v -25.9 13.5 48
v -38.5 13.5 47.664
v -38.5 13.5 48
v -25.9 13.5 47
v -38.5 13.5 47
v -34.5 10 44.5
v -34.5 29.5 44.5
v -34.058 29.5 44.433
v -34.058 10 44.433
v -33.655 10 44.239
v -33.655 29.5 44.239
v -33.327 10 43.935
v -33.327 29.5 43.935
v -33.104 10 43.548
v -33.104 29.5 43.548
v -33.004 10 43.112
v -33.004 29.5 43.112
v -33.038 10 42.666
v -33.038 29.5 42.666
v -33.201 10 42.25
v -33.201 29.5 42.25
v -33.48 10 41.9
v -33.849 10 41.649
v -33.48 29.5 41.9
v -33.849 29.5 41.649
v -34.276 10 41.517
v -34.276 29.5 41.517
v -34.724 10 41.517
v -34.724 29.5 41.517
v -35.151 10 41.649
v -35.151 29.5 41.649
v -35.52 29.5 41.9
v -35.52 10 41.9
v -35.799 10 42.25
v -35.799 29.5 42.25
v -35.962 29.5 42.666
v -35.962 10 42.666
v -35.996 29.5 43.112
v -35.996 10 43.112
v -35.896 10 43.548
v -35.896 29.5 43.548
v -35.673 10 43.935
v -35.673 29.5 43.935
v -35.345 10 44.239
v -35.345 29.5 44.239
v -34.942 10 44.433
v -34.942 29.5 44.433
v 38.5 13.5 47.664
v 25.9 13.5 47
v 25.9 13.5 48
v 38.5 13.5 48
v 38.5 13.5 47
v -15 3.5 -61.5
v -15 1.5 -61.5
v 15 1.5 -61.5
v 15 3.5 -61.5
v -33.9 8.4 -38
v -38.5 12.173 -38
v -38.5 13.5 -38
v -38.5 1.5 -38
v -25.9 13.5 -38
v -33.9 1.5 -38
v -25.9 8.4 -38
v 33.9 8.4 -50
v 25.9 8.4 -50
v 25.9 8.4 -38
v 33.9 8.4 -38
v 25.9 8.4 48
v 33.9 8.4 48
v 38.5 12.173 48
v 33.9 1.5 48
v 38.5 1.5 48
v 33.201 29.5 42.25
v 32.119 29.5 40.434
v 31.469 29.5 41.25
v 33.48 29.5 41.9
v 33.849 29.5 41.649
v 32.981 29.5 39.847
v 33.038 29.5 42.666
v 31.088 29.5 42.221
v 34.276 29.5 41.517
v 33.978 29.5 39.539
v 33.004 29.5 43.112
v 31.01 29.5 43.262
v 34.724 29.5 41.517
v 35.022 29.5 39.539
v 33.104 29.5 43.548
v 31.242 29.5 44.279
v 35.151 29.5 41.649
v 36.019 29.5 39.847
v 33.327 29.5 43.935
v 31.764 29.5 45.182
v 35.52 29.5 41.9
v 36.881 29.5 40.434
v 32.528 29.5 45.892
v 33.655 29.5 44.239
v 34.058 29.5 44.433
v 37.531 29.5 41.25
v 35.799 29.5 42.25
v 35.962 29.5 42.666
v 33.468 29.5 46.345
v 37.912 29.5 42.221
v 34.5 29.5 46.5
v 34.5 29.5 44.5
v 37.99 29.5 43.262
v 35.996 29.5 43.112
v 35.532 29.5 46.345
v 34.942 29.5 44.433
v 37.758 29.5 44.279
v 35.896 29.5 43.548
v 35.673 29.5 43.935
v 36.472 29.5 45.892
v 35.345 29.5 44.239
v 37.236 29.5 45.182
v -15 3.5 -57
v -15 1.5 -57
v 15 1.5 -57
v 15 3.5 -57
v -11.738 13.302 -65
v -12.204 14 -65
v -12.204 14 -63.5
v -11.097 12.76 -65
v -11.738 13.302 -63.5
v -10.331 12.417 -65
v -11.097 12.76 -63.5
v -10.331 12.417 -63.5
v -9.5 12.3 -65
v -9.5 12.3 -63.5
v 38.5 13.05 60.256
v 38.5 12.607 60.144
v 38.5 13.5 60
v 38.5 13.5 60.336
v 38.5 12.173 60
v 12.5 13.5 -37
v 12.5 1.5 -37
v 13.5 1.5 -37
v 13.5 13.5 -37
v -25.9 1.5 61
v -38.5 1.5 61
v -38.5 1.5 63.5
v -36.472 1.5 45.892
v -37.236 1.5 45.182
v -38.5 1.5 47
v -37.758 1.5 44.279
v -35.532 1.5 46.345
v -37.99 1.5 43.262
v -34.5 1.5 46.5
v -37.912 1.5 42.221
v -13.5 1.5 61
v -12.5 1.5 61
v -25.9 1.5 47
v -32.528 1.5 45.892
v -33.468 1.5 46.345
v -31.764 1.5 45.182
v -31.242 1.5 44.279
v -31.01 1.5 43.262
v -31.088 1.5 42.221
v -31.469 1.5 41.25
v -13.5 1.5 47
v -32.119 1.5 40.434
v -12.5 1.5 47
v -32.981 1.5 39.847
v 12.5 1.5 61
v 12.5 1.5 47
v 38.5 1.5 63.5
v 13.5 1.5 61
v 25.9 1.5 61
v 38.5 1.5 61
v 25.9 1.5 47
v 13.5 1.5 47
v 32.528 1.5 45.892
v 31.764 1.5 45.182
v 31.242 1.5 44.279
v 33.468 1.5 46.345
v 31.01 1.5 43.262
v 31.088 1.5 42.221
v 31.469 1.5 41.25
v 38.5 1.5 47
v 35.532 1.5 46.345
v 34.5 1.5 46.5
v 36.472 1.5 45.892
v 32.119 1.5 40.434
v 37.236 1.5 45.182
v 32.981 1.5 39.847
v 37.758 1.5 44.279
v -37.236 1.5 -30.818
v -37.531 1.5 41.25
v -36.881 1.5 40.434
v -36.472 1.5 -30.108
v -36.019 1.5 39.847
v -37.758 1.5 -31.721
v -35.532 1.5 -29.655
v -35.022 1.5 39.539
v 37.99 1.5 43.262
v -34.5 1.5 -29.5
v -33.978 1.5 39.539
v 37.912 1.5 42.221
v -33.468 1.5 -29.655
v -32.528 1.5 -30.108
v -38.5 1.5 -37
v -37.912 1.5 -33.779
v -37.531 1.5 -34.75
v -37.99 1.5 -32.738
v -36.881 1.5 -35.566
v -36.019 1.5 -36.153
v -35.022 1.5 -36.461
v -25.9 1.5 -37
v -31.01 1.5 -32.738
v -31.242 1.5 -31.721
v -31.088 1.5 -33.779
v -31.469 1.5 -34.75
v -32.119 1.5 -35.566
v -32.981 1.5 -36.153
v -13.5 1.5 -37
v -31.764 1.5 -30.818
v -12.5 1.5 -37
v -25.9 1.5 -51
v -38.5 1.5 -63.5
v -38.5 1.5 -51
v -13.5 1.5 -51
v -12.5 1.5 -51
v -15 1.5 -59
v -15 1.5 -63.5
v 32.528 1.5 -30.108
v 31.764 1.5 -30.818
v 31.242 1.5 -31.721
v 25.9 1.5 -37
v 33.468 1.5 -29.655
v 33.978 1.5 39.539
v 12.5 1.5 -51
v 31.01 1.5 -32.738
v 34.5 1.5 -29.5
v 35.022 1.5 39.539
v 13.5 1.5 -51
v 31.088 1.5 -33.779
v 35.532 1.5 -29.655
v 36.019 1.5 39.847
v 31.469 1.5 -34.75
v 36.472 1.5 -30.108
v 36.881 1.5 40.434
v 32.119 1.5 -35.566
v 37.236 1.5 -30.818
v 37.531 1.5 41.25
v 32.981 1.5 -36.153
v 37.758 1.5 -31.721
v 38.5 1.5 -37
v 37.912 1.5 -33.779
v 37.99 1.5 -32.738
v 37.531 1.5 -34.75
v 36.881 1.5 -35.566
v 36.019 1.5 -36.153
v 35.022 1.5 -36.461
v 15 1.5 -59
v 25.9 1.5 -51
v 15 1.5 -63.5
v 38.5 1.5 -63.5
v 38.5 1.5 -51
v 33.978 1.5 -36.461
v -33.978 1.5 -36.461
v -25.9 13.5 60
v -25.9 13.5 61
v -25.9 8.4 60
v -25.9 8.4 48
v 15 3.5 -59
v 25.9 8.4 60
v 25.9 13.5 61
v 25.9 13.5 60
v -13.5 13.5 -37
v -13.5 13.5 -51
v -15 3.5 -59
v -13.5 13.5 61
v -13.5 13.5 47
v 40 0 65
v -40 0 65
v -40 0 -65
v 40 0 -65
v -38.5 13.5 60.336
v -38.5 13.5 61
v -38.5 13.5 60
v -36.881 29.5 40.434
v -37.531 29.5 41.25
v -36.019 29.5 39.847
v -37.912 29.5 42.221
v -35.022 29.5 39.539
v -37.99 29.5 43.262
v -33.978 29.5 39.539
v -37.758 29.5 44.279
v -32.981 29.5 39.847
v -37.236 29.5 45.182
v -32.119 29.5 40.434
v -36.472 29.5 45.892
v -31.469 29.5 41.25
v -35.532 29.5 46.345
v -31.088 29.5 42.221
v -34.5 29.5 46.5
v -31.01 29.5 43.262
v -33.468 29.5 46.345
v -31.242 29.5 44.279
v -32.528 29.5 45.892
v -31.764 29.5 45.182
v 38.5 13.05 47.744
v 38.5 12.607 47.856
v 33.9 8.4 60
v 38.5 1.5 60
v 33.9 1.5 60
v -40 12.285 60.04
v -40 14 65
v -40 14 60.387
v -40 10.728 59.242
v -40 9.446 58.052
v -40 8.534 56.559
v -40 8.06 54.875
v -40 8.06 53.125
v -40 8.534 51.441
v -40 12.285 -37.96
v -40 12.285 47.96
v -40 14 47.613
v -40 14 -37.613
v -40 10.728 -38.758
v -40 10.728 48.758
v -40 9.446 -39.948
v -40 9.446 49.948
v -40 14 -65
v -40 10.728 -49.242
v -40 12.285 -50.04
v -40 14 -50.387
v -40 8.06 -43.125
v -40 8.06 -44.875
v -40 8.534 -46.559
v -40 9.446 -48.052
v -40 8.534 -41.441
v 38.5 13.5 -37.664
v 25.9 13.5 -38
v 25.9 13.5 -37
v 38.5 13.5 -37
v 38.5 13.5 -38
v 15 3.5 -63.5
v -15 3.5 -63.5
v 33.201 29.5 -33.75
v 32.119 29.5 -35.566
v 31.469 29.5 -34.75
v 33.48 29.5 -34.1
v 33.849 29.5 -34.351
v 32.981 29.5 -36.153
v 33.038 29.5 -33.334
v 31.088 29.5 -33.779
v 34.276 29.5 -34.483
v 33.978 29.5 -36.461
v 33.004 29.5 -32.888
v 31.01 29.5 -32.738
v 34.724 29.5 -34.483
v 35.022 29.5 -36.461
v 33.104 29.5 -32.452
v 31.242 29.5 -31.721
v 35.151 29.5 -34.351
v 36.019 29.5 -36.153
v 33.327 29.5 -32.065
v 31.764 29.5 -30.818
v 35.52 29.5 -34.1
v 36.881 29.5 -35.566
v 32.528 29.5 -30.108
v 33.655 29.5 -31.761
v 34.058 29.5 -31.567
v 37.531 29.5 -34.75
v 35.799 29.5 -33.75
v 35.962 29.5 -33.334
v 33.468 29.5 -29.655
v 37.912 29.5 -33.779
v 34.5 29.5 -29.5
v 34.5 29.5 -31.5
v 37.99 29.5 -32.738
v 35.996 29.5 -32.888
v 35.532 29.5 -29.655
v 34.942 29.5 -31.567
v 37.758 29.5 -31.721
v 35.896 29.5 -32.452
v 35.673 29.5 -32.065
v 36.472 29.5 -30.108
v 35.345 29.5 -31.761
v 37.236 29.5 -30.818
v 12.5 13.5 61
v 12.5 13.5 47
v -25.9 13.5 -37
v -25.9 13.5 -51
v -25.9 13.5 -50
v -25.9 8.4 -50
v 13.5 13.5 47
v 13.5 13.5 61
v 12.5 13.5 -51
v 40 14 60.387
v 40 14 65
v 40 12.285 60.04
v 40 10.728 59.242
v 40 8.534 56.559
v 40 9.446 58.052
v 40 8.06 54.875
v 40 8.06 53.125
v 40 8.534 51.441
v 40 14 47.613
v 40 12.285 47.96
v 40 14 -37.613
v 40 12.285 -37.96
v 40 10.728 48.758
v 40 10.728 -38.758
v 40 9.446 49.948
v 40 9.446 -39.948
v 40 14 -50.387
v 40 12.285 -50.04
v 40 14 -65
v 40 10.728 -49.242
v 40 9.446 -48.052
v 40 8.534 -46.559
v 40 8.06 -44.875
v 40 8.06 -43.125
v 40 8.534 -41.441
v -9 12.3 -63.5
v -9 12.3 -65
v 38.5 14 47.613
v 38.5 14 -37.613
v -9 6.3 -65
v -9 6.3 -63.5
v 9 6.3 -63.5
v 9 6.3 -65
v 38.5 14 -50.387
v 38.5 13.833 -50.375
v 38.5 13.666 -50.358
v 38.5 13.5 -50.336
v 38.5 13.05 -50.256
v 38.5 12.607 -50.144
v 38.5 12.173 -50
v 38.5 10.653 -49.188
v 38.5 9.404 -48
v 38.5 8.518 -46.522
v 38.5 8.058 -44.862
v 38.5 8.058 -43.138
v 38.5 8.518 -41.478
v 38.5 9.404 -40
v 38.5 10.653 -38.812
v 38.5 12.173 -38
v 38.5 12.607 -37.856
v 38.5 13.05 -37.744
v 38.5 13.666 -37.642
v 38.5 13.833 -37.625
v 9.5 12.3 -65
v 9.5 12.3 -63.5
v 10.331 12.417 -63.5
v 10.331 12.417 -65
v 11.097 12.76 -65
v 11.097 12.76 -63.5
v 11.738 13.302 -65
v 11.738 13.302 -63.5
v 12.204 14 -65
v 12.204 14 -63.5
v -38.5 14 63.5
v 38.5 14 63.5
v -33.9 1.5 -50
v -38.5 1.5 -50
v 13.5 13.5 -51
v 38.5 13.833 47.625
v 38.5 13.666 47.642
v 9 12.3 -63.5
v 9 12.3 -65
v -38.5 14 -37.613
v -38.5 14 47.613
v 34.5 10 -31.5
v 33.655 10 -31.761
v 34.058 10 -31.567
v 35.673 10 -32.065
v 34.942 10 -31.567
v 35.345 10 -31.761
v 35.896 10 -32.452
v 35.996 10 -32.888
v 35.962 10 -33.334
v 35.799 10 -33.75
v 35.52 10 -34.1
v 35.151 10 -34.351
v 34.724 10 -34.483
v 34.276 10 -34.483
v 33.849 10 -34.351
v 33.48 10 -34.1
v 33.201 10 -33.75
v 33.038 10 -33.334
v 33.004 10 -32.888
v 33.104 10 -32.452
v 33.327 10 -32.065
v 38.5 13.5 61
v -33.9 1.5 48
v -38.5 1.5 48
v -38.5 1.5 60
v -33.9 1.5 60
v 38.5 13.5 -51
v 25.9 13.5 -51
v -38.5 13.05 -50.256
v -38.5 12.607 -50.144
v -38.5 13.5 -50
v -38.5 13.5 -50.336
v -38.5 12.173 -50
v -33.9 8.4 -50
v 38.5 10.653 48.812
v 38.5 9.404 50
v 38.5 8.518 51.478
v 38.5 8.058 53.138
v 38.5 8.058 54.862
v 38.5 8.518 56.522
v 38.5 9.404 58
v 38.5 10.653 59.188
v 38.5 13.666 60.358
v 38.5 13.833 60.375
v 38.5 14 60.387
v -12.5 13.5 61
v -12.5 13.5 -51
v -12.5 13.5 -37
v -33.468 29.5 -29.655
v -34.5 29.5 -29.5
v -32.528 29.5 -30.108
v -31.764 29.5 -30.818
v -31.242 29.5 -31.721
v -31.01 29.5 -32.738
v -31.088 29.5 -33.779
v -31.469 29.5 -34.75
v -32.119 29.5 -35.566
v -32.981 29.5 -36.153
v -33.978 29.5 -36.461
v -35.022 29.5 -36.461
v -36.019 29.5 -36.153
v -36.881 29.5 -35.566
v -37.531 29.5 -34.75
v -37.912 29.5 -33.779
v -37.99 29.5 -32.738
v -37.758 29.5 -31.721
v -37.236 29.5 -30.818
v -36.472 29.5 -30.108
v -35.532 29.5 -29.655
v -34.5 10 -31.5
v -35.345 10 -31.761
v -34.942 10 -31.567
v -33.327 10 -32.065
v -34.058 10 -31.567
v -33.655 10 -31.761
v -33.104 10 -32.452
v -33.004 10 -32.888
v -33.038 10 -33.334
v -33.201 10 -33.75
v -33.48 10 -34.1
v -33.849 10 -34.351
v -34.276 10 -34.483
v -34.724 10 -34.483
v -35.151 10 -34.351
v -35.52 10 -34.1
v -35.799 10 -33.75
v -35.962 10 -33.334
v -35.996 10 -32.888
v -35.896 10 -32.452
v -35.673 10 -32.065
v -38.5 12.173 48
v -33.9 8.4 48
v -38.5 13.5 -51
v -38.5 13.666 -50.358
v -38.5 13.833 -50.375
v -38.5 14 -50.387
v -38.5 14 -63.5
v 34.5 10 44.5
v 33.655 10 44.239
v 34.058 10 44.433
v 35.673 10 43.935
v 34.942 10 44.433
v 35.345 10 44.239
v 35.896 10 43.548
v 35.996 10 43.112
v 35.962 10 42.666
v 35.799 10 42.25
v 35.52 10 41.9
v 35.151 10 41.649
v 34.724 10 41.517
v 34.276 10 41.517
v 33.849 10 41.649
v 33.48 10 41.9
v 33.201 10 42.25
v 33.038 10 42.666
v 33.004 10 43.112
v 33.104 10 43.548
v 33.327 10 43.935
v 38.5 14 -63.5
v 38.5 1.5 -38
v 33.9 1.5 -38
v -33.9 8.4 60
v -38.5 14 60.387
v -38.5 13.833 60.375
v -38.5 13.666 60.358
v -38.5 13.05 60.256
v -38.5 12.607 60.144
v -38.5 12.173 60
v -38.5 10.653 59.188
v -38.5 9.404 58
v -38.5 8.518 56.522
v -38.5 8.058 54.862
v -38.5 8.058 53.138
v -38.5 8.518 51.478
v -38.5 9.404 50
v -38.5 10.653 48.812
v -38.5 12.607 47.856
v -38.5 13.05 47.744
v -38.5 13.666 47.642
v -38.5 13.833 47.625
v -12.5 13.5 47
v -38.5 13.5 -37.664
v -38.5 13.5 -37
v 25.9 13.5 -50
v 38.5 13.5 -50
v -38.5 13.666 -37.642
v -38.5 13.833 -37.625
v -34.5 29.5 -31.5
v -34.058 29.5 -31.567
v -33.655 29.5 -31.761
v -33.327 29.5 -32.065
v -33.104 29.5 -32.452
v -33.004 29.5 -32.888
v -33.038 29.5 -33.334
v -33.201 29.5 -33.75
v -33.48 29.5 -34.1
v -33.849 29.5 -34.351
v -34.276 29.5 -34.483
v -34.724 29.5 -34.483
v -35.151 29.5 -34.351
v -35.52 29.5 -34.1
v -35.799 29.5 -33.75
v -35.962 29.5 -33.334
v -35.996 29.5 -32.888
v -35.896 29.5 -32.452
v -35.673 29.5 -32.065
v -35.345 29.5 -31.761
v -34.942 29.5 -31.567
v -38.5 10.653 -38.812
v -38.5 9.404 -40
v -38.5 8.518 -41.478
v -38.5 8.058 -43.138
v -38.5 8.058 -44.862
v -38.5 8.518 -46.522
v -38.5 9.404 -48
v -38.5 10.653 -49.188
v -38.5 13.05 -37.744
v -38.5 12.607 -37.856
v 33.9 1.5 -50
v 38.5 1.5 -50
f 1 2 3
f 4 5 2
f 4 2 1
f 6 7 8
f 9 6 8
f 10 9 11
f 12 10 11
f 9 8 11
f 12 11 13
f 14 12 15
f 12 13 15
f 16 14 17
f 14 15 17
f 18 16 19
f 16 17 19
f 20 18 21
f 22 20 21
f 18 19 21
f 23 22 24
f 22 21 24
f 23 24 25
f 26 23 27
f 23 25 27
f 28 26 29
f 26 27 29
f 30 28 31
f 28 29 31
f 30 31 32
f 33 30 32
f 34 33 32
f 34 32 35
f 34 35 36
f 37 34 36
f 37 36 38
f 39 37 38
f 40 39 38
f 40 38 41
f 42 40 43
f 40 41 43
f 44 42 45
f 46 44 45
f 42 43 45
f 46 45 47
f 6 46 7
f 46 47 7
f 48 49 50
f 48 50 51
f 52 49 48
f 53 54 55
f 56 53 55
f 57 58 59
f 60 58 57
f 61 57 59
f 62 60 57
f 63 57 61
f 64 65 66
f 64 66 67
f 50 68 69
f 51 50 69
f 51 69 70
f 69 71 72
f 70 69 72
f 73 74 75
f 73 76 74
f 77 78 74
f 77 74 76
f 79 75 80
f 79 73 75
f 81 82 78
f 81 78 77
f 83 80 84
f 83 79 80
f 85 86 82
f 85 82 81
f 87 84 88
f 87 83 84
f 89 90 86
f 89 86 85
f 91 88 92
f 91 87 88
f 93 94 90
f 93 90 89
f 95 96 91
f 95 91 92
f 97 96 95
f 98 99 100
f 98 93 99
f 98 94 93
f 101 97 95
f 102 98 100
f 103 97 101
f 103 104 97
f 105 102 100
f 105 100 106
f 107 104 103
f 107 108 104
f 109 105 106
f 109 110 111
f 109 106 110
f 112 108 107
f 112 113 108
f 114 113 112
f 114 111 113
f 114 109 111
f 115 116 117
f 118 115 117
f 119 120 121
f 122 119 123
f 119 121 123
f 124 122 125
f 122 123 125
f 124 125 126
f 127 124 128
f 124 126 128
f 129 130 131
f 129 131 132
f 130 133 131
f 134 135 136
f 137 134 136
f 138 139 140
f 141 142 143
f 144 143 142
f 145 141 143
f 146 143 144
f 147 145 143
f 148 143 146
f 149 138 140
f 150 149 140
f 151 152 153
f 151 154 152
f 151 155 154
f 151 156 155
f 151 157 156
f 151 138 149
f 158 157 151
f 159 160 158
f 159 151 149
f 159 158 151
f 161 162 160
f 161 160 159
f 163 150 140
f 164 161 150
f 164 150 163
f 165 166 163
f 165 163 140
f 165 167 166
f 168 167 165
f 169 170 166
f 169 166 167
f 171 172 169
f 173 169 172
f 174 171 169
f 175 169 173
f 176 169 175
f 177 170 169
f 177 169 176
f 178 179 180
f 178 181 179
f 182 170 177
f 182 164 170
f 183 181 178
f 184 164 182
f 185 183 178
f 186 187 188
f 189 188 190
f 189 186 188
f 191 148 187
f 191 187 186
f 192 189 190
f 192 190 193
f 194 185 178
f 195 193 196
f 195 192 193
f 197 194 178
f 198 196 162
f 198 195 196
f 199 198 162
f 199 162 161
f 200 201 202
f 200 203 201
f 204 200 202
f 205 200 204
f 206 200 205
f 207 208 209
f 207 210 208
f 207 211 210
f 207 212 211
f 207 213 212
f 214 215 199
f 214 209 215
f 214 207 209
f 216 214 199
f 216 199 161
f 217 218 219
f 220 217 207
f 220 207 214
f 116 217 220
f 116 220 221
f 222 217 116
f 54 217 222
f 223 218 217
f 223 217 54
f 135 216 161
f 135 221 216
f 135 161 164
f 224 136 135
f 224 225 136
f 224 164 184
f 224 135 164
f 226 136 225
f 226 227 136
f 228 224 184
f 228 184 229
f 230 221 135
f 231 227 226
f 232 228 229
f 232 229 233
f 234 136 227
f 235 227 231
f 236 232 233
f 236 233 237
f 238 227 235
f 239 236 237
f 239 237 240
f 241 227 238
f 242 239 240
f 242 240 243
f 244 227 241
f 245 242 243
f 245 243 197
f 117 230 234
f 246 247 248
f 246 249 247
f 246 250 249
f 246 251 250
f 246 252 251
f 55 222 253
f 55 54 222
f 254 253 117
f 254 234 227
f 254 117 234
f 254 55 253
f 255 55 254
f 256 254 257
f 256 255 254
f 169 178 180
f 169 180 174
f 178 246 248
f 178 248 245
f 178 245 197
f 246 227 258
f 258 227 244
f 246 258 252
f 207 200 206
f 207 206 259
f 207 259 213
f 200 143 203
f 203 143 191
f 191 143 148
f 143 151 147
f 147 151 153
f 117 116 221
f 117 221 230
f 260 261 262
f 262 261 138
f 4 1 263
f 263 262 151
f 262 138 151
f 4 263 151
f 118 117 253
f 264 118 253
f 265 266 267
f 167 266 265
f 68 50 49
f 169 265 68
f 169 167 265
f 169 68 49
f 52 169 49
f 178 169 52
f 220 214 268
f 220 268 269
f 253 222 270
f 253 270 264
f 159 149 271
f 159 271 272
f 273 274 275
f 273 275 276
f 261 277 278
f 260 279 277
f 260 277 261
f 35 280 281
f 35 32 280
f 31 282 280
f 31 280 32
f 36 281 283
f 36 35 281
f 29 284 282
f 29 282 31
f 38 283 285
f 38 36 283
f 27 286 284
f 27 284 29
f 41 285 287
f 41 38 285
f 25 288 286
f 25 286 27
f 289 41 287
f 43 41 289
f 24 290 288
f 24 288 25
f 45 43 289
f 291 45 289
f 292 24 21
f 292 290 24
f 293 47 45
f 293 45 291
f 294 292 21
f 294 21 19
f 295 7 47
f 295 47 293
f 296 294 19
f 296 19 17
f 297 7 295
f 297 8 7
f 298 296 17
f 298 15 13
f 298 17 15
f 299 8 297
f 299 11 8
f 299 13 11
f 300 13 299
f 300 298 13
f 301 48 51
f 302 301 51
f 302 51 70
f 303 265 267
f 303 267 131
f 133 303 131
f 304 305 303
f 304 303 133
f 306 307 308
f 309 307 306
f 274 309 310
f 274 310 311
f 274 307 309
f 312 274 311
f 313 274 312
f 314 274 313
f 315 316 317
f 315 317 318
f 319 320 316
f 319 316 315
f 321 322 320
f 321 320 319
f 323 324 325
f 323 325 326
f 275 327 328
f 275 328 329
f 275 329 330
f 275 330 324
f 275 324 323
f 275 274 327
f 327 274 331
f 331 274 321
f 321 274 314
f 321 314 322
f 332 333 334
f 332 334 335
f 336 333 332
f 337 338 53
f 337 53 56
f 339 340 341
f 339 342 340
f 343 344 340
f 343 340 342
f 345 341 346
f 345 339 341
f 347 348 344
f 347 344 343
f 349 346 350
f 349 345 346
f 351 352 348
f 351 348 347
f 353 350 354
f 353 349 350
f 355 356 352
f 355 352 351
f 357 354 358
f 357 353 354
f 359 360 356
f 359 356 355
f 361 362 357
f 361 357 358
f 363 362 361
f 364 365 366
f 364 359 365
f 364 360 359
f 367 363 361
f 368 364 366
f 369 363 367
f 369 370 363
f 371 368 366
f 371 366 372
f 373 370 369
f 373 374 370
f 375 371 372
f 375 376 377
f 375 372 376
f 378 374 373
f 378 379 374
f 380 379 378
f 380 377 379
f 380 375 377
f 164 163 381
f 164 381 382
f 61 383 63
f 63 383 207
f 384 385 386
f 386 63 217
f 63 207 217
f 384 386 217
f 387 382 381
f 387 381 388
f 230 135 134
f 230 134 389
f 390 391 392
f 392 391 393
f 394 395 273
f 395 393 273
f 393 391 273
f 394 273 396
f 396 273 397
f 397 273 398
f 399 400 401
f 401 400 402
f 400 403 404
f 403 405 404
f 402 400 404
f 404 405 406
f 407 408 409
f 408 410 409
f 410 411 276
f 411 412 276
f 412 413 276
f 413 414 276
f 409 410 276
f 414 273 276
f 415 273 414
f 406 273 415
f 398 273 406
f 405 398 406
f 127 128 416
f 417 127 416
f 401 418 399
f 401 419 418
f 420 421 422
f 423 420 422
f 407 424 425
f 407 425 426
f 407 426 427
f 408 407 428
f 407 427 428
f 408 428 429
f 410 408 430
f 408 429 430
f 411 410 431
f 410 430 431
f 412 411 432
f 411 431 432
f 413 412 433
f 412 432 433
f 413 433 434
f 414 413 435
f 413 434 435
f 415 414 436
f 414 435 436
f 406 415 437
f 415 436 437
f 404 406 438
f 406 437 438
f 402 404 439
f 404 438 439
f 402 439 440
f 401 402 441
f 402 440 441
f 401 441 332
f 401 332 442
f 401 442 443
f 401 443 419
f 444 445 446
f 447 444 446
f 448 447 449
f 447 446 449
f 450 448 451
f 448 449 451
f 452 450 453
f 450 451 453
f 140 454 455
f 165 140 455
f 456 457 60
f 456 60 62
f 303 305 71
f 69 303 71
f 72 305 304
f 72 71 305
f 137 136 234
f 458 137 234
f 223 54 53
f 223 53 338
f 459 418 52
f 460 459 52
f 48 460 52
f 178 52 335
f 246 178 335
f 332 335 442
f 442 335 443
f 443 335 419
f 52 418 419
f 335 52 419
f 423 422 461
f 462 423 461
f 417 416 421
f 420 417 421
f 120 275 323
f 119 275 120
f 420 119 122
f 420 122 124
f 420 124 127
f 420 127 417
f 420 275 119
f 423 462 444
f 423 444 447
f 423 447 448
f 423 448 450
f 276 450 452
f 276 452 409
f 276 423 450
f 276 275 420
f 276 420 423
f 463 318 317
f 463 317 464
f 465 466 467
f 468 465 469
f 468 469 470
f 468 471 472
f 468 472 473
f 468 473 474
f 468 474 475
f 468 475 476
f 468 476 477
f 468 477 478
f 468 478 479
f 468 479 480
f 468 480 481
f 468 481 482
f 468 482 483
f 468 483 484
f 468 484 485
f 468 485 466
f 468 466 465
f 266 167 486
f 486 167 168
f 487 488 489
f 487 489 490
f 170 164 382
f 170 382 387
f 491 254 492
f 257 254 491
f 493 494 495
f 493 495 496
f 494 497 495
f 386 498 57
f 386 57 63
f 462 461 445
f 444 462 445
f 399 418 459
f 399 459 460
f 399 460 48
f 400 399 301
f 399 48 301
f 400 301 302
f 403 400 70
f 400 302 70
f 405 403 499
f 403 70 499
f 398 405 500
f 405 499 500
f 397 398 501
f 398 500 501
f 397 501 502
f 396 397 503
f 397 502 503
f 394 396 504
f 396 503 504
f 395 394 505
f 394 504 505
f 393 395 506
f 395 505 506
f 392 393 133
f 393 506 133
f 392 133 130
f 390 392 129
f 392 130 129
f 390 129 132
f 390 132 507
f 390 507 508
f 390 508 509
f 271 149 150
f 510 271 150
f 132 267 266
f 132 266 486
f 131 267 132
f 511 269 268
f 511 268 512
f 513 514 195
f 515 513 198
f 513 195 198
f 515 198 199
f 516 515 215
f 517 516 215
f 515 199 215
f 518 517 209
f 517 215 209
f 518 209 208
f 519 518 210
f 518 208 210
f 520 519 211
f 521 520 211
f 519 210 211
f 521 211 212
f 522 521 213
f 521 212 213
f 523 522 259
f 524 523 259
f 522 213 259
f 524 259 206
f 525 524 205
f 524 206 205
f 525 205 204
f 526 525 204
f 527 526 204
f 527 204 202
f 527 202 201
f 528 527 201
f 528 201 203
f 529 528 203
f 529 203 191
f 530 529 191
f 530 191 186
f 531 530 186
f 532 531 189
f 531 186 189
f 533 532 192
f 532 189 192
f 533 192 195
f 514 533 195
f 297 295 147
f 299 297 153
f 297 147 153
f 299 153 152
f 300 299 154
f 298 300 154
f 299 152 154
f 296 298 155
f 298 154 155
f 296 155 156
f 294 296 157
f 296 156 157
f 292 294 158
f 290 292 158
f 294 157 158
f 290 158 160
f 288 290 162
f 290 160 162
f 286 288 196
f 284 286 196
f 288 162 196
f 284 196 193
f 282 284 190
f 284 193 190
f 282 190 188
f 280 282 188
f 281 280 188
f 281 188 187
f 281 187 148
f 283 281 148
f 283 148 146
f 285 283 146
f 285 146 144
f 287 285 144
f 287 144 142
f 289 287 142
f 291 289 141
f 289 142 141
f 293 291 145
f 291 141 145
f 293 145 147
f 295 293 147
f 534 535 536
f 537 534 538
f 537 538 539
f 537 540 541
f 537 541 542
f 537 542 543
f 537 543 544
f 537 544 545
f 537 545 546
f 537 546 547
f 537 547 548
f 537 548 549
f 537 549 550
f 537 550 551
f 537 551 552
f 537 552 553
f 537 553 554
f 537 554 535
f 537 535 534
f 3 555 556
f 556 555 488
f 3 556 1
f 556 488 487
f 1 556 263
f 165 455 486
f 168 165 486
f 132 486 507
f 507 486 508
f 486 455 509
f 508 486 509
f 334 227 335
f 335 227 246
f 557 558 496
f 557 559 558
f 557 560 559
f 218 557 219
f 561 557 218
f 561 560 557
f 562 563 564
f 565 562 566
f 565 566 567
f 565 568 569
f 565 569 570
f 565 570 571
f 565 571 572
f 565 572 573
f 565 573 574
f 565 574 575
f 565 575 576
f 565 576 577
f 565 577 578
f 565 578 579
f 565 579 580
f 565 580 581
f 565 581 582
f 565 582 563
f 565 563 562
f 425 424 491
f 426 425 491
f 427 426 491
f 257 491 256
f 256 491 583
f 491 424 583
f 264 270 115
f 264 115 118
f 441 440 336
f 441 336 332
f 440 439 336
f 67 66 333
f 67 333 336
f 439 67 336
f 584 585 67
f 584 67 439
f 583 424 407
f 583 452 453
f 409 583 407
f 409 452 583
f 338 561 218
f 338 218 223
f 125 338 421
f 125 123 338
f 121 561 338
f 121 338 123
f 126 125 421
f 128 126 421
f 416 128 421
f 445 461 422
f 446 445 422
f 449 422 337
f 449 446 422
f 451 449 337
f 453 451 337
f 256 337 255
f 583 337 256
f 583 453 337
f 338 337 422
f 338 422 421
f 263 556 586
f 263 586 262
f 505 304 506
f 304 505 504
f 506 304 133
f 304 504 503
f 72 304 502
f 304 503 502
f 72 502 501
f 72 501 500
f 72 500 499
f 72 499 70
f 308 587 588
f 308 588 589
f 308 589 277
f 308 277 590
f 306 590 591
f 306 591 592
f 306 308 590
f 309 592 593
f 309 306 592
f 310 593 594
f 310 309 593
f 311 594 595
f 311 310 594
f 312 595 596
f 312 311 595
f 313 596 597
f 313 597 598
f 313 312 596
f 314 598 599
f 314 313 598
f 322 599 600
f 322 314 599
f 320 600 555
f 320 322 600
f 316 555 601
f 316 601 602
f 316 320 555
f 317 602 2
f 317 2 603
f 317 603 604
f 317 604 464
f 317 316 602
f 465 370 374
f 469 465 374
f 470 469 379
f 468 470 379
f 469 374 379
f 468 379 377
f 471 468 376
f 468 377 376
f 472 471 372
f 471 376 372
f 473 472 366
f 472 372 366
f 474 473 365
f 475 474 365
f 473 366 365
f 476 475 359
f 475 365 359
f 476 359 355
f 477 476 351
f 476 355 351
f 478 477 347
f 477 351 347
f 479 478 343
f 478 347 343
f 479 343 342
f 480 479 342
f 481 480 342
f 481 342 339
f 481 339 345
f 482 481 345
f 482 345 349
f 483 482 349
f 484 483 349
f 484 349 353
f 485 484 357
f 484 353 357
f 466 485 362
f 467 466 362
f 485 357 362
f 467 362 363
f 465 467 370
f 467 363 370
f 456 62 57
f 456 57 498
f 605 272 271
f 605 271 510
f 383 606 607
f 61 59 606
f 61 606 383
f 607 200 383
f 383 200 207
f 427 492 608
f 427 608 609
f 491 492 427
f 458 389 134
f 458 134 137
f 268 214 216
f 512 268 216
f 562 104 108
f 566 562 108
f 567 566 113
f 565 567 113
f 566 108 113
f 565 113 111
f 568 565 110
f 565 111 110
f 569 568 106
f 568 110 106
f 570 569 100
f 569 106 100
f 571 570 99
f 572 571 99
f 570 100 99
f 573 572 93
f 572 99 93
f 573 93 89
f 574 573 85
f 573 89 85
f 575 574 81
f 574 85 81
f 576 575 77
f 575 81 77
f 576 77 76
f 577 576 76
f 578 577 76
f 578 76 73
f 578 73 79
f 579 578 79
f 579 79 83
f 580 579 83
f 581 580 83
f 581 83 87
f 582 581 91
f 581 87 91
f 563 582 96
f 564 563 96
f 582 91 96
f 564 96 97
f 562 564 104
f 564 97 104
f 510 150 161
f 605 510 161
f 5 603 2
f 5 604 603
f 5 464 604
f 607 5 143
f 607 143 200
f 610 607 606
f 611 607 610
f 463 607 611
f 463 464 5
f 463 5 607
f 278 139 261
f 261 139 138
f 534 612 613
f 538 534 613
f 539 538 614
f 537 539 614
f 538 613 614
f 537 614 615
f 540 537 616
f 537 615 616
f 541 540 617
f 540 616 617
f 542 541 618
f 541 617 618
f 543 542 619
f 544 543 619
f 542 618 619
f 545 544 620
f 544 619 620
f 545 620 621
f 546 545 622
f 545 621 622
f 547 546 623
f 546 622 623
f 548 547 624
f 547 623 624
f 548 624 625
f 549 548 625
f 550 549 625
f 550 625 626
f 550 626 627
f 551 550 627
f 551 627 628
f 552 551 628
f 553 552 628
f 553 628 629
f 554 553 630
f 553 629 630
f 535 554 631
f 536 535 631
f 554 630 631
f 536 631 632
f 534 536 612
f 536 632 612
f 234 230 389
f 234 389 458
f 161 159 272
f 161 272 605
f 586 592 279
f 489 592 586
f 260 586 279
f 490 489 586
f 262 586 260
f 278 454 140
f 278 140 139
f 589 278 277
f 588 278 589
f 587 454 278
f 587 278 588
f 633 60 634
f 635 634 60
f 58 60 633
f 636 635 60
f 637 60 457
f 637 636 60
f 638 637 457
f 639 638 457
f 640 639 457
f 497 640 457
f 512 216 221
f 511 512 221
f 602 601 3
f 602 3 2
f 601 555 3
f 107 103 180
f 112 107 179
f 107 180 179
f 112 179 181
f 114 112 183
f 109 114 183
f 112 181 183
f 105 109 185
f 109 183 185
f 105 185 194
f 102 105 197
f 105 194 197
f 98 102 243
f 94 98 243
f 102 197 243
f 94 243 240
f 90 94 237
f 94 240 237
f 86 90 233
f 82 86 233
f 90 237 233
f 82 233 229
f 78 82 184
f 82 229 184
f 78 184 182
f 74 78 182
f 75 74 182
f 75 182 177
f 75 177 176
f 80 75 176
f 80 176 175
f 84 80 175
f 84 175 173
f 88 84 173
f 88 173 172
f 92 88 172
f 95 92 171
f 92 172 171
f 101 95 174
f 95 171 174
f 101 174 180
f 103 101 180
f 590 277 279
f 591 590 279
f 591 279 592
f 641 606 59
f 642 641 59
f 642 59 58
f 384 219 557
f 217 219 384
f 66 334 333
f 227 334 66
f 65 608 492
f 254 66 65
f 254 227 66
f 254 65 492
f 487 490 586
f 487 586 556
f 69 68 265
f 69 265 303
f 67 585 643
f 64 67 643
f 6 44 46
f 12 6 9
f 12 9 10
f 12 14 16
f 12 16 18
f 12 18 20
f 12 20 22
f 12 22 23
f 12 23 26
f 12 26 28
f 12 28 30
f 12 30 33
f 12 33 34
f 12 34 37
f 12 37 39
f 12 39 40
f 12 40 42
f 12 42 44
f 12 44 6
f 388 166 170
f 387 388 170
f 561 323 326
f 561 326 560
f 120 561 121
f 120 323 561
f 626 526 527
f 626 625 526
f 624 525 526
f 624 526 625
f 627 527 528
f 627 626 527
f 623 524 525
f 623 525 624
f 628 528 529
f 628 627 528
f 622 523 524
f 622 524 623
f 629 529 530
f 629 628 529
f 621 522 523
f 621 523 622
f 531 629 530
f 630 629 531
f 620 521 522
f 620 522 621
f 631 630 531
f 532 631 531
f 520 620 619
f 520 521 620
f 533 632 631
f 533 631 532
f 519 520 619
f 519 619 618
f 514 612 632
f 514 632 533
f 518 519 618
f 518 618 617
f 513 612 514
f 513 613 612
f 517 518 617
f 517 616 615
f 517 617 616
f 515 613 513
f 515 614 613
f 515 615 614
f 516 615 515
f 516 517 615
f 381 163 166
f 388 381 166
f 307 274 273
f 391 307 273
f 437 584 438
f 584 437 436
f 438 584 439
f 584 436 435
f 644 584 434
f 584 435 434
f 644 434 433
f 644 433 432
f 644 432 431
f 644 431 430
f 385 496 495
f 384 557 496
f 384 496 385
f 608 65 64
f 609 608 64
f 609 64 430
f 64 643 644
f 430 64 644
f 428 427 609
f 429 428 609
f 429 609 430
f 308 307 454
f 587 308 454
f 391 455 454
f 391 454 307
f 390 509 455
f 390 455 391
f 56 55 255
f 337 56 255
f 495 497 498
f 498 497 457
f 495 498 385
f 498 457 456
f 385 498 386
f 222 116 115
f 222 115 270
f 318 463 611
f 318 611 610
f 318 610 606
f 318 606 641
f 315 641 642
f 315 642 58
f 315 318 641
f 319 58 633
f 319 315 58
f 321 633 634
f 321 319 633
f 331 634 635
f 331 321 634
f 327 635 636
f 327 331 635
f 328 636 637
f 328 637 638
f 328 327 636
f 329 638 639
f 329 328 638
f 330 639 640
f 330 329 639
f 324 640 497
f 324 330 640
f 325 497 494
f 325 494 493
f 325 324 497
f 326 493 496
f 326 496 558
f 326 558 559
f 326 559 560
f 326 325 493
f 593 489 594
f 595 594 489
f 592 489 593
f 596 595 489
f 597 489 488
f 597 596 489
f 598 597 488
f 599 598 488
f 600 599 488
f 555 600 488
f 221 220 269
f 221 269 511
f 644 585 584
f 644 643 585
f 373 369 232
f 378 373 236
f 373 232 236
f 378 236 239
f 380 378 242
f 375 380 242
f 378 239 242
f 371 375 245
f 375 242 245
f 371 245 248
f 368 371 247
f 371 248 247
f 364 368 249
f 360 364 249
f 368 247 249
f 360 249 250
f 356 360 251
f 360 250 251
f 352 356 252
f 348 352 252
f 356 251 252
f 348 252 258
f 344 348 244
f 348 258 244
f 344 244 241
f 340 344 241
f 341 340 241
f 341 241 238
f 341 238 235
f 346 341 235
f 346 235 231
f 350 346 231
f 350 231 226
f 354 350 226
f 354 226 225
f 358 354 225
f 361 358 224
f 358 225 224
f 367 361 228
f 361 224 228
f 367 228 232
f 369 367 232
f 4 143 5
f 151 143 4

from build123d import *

# Parameters (mm, degrees)
SKETCH_262_W         = 80
SKETCH_262_H         = 130
EXTRUDE_1_DEPTH      = 14
SKETCH_1_W           = 77
SKETCH_1_H           = 127
CUT_EXTRUDE_1_DEPTH  = 12.5
CUT_EXTRUDE_2_DEPTH  = 2
SKETCH_10_W          = 8
SKETCH_10_H          = 12
EXTRUDE_2_DEPTH      = 6.9
SKETCH_11_W          = 12.6
SKETCH_11_H          = 1
EXTRUDE_3_DEPTH      = 12
SKETCH_13_R          = 3.5
EXTRUDE_4_DEPTH      = 28
CUT_EXTRUDE_9_DEPTH  = 1.5
CUT_EXTRUDE_START    = -1.5
CUT_EXTRUDE_10_DEPTH = 1.5
CUT_EXTRUDE_11_DEPTH = 1.5
CUT_EXTRUDE_12_DEPTH = 1.5
SKETCH_15_R          = 1.5
CUT_EXTRUDE_14_DEPTH = 19.5
SKETCH_16_W          = 30
SKETCH_16_H          = 2
EXTRUDE_5_DEPTH      = 2
SKETCH_17_W          = 1
SKETCH_17_H          = 14
EXTRUDE_6_DEPTH      = 12


with BuildPart() as part:
    # Sketch 262 → Бобышка-Вытянуть1 (new body)
    with BuildSketch(Plane(origin=(0, 0, 0), x_dir=(1, 0, 0), z_dir=(0, 1, 0))):
        Rectangle(SKETCH_262_W, SKETCH_262_H)
    extrude(amount=EXTRUDE_1_DEPTH)

    # Эскиз1 → Вырез-Вытянуть1 (cut)
    with BuildSketch(Plane(origin=(0, 14, 0), x_dir=(1, 0, 0), z_dir=(0, 1, 0))):
        Rectangle(SKETCH_1_W, SKETCH_1_H)
    extrude(amount=-CUT_EXTRUDE_1_DEPTH, mode=Mode.SUBTRACT)

    # Эскиз2 → Вырез-Вытянуть2 (cut)
    with BuildSketch(Plane.XY.offset(-63.5)):
        with BuildLine():
            Line((-9, 18.3), (-9.5, 18.3))
            ThreePointArc((-9.5, 18.3), (-12.5, 15.3), (-9.5, 12.3))
            Line((-9.5, 12.3), (-9, 12.3))
            Line((-9, 12.3), (-9, 6.3))
            Line((-9, 6.3), (9, 6.3))
            Line((9, 6.3), (9, 12.3))
            Line((9, 12.3), (9.5, 12.3))
            ThreePointArc((9.5, 12.3), (12.5, 15.3), (9.5, 18.3))
            Line((9.5, 18.3), (9, 18.3))
            Line((9, 18.3), (9, 24.3))
            Line((9, 24.3), (-9, 24.3))
            Line((-9, 24.3), (-9, 18.3))
        make_face()
    extrude(amount=-CUT_EXTRUDE_2_DEPTH, mode=Mode.SUBTRACT)

    # Эскиз10 → Бобышка-Вытянуть2 (add)
    with BuildSketch(Plane(origin=(0, 1.5, 0), x_dir=(1, 0, 0), z_dir=(0, 1, 0))):
        with Locations((-29.9, 44)):
            Rectangle(SKETCH_10_W, SKETCH_10_H)
        with Locations((29.9, 44)):
            Rectangle(SKETCH_10_W, SKETCH_10_H)
        with Locations((-29.9, -54)):
            Rectangle(SKETCH_10_W, SKETCH_10_H)
        with Locations((29.9, -54)):
            Rectangle(SKETCH_10_W, SKETCH_10_H)
    extrude(amount=EXTRUDE_2_DEPTH)

    # Эскиз11 → Бобышка-Вытянуть3 (add)
    with BuildSketch(Plane(origin=(0, 1.5, 0), x_dir=(1, 0, 0), z_dir=(0, 1, 0))):
        with Locations((-32.2, 50.5)):
            Rectangle(SKETCH_11_W, SKETCH_11_H)
        with Locations((32.2, 50.5)):
            Rectangle(SKETCH_11_W, SKETCH_11_H)
        with Locations((-32.2, 37.5)):
            Rectangle(SKETCH_11_W, SKETCH_11_H)
        with Locations((32.2, 37.5)):
            Rectangle(SKETCH_11_W, SKETCH_11_H)
        with Locations((32.2, -47.5)):
            Rectangle(SKETCH_11_W, SKETCH_11_H)
        with Locations((32.2, -60.5)):
            Rectangle(SKETCH_11_W, SKETCH_11_H)
        with Locations((-32.2, -47.5)):
            Rectangle(SKETCH_11_W, SKETCH_11_H)
        with Locations((-32.2, -60.5)):
            Rectangle(SKETCH_11_W, SKETCH_11_H)
    extrude(amount=EXTRUDE_3_DEPTH)

    # Эскиз13 → Бобышка-Вытянуть4 (add)
    with BuildSketch(Plane(origin=(0, 1.5, 0), x_dir=(1, 0, 0), z_dir=(0, 1, 0))):
        with Locations(Location((-34.5, 33, 0), (0, 0, 270))):
            Circle(SKETCH_13_R)
        with Locations(Location((34.5, 33, 0), (0, 0, 270))):
            Circle(SKETCH_13_R)
        with Locations(Location((-34.5, -43, 0), (0, 0, 270))):
            Circle(SKETCH_13_R)
        with Locations(Location((34.5, -43, 0), (0, 0, 270))):
            Circle(SKETCH_13_R)
    extrude(amount=EXTRUDE_4_DEPTH)

    # Эскиз5 → Вырез-Вытянуть9 (cut)
    with BuildSketch(Plane.ZY.offset(40)):
        with BuildLine():
            Line((57.199546833, 20.146147769), (57.196157558, 19.944779244))
            ThreePointArc((57.196157558, 19.944779244), (54, 8), (50.803842442, 19.944779244))
            Line((50.803842442, 19.944779244), (50.800453167, 20.146147769))
            ThreePointArc((50.800453167, 20.146147769), (54, 23.4), (57.199546833, 20.146147769))
        make_face()
    extrude(amount=-CUT_EXTRUDE_9_DEPTH, mode=Mode.SUBTRACT)

    # Эскиз6 → Вырез-Вытянуть10 (cut)
    with BuildSketch(Plane(origin=(40, 0, 0), x_dir=(0, 0, -1), z_dir=(1, 0, 0)).offset(CUT_EXTRUDE_START)):
        with BuildLine():
            Line((-50.8, 20.2), (-50.8, 19.942562584))
            ThreePointArc((-50.8, 19.942562584), (-54, 8), (-57.2, 19.942562584))
            Line((-57.2, 19.942562584), (-57.2, 20.2))
            ThreePointArc((-57.2, 20.2), (-54, 23.4), (-50.8, 20.2))
        make_face()
    extrude(amount=CUT_EXTRUDE_10_DEPTH, mode=Mode.SUBTRACT)

    # Эскиз3 → Вырез-Вытянуть11 (cut)
    with BuildSketch(Plane.ZY.offset(40)):
        with BuildLine():
            Line((-40.8, 20.2), (-40.8, 19.942562584))
            ThreePointArc((-40.8, 19.942562584), (-44, 8), (-47.2, 19.942562584))
            Line((-47.2, 19.942562584), (-47.2, 20.2))
            ThreePointArc((-47.2, 20.2), (-44, 23.4), (-40.8, 20.2))
        make_face()
    extrude(amount=-CUT_EXTRUDE_11_DEPTH, mode=Mode.SUBTRACT)

    # Эскиз9 → Вырез-Вытянуть12 (cut)
    with BuildSketch(Plane(origin=(40, 0, 0), x_dir=(0, 0, -1), z_dir=(1, 0, 0)).offset(CUT_EXTRUDE_START)):
        with BuildLine():
            Line((47.2, 20.2), (47.2, 19.942562584))
            ThreePointArc((47.2, 19.942562584), (44, 8), (40.8, 19.942562584))
            Line((40.8, 19.942562584), (40.8, 20.2))
            ThreePointArc((40.8, 20.2), (44, 23.4), (47.2, 20.2))
        make_face()
    extrude(amount=CUT_EXTRUDE_12_DEPTH, mode=Mode.SUBTRACT)

    # Эскиз15 → Вырез-Вытянуть14 (cut)
    with BuildSketch(Plane(origin=(0, 29.5, 0), x_dir=(1, 0, 0), z_dir=(0, 1, 0))):
        with Locations(Location((-34.5, 33, 0), (0, 0, 270))):
            Circle(SKETCH_15_R)
        with Locations(Location((34.5, 33, 0), (0, 0, 270))):
            Circle(SKETCH_15_R)
        with Locations(Location((34.5, -43, 0), (0, 0, 270))):
            Circle(SKETCH_15_R)
        with Locations(Location((-34.5, -43, 0), (0, 0, 270))):
            Circle(SKETCH_15_R)
    extrude(amount=-CUT_EXTRUDE_14_DEPTH, mode=Mode.SUBTRACT)

    # Эскиз16 → Бобышка-Вытянуть5 (add)
    with BuildSketch(Plane(origin=(0, 1.5, 0), x_dir=(1, 0, 0), z_dir=(0, 1, 0))):
        with Locations((0, 62.5)):
            Rectangle(SKETCH_16_W, SKETCH_16_H)
        with Locations((0, 58)):
            Rectangle(SKETCH_16_W, SKETCH_16_H)
    extrude(amount=EXTRUDE_5_DEPTH)

    # Эскиз17 → Бобышка-Вытянуть6 (add)
    with BuildSketch(Plane(origin=(0, 1.5, 0), x_dir=(1, 0, 0), z_dir=(0, 1, 0))):
        with Locations((-13, 44)):
            Rectangle(SKETCH_17_W, SKETCH_17_H)
        with Locations((13, 44)):
            Rectangle(SKETCH_17_W, SKETCH_17_H)
        with Locations((-13, -54)):
            Rectangle(SKETCH_17_W, SKETCH_17_H)
        with Locations((13, -54)):
            Rectangle(SKETCH_17_W, SKETCH_17_H)
    extrude(amount=EXTRUDE_6_DEPTH)


solid = part.part
